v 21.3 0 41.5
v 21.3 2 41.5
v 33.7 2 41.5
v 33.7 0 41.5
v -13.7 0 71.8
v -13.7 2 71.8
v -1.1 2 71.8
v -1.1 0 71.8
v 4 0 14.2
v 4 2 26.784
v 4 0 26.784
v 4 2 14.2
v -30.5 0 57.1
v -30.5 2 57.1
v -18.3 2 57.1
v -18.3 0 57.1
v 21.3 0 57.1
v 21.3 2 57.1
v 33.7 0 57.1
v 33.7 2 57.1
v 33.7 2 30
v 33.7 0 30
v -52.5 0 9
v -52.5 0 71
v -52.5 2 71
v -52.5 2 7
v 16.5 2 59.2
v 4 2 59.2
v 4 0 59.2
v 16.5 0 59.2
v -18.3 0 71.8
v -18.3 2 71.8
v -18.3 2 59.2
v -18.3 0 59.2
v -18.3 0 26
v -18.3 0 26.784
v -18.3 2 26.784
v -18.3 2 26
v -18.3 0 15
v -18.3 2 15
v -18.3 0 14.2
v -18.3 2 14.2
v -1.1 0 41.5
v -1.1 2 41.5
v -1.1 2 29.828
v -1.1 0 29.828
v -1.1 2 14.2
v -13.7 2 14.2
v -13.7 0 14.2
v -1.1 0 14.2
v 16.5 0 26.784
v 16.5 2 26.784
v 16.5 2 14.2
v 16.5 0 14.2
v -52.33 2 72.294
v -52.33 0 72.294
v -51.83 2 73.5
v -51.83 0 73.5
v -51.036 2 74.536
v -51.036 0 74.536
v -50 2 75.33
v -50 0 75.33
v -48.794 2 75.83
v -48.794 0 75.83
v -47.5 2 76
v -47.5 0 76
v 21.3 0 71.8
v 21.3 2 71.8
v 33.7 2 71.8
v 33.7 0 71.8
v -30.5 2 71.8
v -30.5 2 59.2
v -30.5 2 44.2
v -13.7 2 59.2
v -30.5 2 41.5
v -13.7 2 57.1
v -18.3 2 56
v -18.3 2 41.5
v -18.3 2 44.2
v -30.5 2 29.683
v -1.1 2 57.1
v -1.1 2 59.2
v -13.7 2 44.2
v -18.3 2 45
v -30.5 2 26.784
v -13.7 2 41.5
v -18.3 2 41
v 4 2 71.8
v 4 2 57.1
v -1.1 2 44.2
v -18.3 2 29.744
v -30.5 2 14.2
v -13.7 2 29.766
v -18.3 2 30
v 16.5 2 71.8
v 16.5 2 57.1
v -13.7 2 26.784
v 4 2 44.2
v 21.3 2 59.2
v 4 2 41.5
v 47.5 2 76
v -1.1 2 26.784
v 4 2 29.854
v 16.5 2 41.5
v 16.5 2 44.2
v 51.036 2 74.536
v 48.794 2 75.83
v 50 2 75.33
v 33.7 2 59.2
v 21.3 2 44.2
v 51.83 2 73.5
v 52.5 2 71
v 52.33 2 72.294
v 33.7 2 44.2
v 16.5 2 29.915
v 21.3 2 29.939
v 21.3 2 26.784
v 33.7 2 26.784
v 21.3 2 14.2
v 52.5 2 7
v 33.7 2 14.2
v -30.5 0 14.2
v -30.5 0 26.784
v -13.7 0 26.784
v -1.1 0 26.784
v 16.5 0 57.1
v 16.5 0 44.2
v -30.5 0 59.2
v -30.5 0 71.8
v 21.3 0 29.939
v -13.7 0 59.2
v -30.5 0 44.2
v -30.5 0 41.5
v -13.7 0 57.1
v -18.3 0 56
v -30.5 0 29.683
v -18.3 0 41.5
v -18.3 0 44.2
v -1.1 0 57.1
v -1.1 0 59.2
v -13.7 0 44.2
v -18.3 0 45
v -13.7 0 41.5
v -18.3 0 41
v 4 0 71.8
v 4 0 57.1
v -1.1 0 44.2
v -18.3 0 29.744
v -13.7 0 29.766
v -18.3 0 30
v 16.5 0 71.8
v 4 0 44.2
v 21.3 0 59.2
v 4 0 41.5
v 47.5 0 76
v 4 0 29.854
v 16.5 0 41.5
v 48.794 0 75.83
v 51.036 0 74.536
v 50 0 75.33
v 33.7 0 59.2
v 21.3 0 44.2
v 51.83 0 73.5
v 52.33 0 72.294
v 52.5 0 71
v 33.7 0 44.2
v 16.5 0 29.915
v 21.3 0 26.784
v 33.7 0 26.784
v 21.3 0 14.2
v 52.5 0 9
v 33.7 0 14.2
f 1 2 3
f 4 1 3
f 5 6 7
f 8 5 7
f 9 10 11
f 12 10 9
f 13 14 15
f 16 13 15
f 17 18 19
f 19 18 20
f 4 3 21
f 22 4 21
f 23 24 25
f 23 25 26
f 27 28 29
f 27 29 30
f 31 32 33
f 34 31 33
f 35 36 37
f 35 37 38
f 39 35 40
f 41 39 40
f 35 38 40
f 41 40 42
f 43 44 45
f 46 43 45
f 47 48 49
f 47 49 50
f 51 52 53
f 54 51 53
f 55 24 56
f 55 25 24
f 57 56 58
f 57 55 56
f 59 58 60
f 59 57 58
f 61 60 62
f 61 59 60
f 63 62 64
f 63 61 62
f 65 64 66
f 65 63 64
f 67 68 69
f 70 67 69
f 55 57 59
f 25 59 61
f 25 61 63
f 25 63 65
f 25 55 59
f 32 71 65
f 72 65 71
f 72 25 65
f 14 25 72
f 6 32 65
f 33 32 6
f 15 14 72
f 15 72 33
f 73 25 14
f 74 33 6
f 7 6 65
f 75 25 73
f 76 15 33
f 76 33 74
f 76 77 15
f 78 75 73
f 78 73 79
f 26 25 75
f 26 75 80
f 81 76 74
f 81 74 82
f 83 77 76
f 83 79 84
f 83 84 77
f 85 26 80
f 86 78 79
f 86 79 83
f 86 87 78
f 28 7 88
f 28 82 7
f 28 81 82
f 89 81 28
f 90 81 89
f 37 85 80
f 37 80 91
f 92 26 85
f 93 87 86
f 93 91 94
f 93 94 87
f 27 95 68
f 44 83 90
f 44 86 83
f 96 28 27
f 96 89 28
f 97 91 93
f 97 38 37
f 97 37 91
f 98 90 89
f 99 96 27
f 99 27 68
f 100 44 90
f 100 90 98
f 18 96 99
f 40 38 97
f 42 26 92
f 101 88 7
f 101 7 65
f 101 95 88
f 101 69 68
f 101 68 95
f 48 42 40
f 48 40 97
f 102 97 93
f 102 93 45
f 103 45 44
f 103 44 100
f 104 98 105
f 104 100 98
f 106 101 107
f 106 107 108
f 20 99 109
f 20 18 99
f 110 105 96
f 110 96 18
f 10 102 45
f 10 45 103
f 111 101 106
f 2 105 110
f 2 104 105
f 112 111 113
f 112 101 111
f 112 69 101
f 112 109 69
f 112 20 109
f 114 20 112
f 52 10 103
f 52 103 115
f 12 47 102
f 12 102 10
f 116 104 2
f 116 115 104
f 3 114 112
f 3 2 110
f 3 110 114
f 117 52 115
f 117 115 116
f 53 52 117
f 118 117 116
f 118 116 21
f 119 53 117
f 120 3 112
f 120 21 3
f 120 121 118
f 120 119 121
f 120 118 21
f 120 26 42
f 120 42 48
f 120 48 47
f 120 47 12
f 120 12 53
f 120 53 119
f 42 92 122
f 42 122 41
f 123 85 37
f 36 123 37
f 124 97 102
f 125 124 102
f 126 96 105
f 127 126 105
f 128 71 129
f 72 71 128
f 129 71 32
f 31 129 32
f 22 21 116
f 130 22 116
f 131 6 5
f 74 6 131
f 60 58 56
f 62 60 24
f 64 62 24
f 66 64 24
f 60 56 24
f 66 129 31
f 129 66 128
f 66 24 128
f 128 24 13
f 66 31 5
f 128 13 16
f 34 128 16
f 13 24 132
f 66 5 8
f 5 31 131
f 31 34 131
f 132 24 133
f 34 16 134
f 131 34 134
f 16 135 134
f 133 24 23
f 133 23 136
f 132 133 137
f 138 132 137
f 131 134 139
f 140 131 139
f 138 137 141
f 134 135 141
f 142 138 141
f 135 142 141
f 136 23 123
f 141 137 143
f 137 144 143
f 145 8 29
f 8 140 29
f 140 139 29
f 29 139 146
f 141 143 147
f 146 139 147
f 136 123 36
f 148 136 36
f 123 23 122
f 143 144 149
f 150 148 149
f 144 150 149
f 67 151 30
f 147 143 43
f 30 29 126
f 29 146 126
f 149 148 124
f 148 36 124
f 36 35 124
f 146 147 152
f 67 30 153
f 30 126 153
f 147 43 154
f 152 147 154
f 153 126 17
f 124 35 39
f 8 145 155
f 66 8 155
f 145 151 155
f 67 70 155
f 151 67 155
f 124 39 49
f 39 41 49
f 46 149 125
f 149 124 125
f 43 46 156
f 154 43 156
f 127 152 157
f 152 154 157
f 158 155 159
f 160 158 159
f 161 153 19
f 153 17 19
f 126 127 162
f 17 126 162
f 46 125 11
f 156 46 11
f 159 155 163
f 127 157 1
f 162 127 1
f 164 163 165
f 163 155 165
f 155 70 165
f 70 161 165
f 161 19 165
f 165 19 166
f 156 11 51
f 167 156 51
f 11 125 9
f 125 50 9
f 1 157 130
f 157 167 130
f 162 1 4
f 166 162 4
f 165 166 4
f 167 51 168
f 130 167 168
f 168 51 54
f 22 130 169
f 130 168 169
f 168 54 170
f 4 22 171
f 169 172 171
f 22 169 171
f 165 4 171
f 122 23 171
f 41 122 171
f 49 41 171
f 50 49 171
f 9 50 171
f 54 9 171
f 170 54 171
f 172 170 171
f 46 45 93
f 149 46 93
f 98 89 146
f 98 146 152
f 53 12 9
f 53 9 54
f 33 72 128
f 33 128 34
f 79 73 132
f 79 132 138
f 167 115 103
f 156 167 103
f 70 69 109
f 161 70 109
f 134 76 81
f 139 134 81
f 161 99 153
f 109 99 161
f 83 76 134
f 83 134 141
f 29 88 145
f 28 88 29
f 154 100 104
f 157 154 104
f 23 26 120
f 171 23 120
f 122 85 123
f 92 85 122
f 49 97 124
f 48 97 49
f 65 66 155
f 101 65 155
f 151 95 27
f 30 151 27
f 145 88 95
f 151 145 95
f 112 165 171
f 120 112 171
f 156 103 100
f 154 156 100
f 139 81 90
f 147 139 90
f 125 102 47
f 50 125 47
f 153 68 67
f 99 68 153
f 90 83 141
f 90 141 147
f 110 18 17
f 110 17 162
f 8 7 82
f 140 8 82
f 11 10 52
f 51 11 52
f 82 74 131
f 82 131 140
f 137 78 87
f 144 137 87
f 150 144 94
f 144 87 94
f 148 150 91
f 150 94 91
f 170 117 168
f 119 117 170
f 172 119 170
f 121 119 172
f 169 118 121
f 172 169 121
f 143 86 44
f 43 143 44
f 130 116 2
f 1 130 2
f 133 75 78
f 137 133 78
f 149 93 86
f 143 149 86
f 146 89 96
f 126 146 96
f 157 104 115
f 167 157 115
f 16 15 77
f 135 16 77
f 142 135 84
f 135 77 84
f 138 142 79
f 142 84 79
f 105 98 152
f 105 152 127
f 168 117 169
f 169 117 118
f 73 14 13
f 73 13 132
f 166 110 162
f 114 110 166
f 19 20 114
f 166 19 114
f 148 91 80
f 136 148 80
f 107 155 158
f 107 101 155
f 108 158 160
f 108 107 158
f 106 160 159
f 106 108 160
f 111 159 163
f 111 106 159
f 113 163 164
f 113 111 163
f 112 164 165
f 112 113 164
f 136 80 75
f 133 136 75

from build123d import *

# Parameters (mm, degrees)
SKETCH2_W           = 105
SKETCH2_H           = 69
SKETCH2_W_2         = 12.176237233
SKETCH2_H_2         = 12
SKETCH2_W_3         = 12
SKETCH2_W_4         = 11
SKETCH2_H_3         = 11
SKETCH2_W_5         = 10.781198293
BOSS_EXTRUDE1_DEPTH = 2
FILLET1_R           = 5
FILLET2_R           = 5
CHAMFER1_SIZE       = 2
SKETCH3_W           = 12.4
SKETCH3_H           = 12.584292926
SKETCH3_W_2         = 12.5
SKETCH3_W_3         = 12.6
SKETCH3_W_4         = 12.2
SKETCH3_H_2         = 12.9
SKETCH3_H_3         = 12.6
CUT_EXTRUDE1_DEPTH  = 10
SKETCH4_W           = 0.6
SKETCH4_H           = 11
BOSS_EXTRUDE2_DEPTH = 2
SKETCH5_W           = 0.6
SKETCH5_H           = 11
BOSS_EXTRUDE3_DEPTH = 2
SKETCH6_W           = 0.8
SKETCH6_H           = 11
SKETCH6_W_2         = 0.4
SKETCH6_W_3         = 0.776237233
BOSS_EXTRUDE4_DEPTH = 2


with BuildPart() as part:
    # Sketch2 → Boss-Extrude1 (new body)
    with BuildSketch(Plane(origin=(0, 0, 0), x_dir=(1, 0, 0), z_dir=(0, 1, 0))):
        with Locations((0, -41.5)):
            Rectangle(SKETCH2_W, SKETCH2_H)
        with Locations((-23.611881384, -66)):
            Rectangle(SKETCH2_W_2, SKETCH2_H_2, mode=Mode.SUBTRACT)
        with Locations((11.3, -66)):
            Rectangle(SKETCH2_W_3, SKETCH2_H_2, mode=Mode.SUBTRACT)
        with Locations((28.8, -66)):
            Rectangle(SKETCH2_W_4, SKETCH2_H_2, mode=Mode.SUBTRACT)
        with Locations((28.8, -20.5)):
            Rectangle(SKETCH2_W_4, SKETCH2_H_3, mode=Mode.SUBTRACT)
        with Locations((11.3, -20.5)):
            Rectangle(SKETCH2_W_3, SKETCH2_H_3, mode=Mode.SUBTRACT)
        with Locations((-6.090599146, -20.5)):
            Rectangle(SKETCH2_W_5, SKETCH2_H_3, mode=Mode.SUBTRACT)
        with Locations((-6.090599146, -66)):
            Rectangle(SKETCH2_W_5, SKETCH2_H_2, mode=Mode.SUBTRACT)
        with Locations((-23.611881384, -20.5)):
            Rectangle(SKETCH2_W_2, SKETCH2_H_3, mode=Mode.SUBTRACT)
        with Locations((-23.611881384, -35.5)):
            Rectangle(SKETCH2_W_2, SKETCH2_H_3, mode=Mode.SUBTRACT)
        with Locations((-23.611881384, -50.5)):
            Rectangle(SKETCH2_W_2, SKETCH2_H_3, mode=Mode.SUBTRACT)
        with Locations((28.8, -50.5)):
            Rectangle(SKETCH2_W_4, SKETCH2_H_3, mode=Mode.SUBTRACT)
        with Locations((28.8, -35.5)):
            Rectangle(SKETCH2_W_4, SKETCH2_H_3, mode=Mode.SUBTRACT)
        with Locations((11.3, -50.5)):
            Rectangle(SKETCH2_W_3, SKETCH2_H_3, mode=Mode.SUBTRACT)
        with Locations((-6.090599146, -50.5)):
            Rectangle(SKETCH2_W_5, SKETCH2_H_3, mode=Mode.SUBTRACT)
        with Locations((-6.090599146, -35.5)):
            Rectangle(SKETCH2_W_5, SKETCH2_H_3, mode=Mode.SUBTRACT)
        with Locations((11.3, -35.5)):
            Rectangle(SKETCH2_W_3, SKETCH2_H_3, mode=Mode.SUBTRACT)
    extrude(amount=BOSS_EXTRUDE1_DEPTH)

    # Fillet1
    fillet1_edges = [part.edges().sort_by_distance(p)[0] for p in [
        (-52.5, 1, 76),
    ]]
    fillet(fillet1_edges, radius=FILLET1_R)

    # Fillet2
    fillet2_edges = [part.edges().sort_by_distance(p)[0] for p in [
        (52.5, 1, 76),
    ]]
    fillet(fillet2_edges, radius=FILLET2_R)

    # Chamfer1
    chamfer1_edges = [part.edges().sort_by_distance(p)[0] for p in [
        (0, 0, 7),
    ]]
    chamfer(chamfer1_edges, length=CHAMFER1_SIZE - 0.0001)  # a hair under: the kernel refuses the full size

    # Sketch3 → Cut-Extrude1 (cut)
    with BuildSketch(Plane(origin=(0, 2, 0), x_dir=(1, 0, 0), z_dir=(0, 1, 0))):
        with Locations((27.5, -20.492146463)):
            Rectangle(SKETCH3_W, SKETCH3_H)
        with Locations((10.25, -20.492146463)):
            Rectangle(SKETCH3_W_2, SKETCH3_H)
        with Locations((-7.4, -20.492146463)):
            Rectangle(SKETCH3_W_3, SKETCH3_H)
        with Locations((-24.4, -20.492146463)):
            Rectangle(SKETCH3_W_4, SKETCH3_H)
        Polygon((-30.5, -41.5), (-18.3, -41.5), (-18.3, -29.743553264), (-30.5, -29.683386914), align=None)
        Polygon((-13.7, -41.5), (-1.1, -41.5), (-1.1, -29.828377953), (-13.7, -29.766238937), align=None)
        Polygon((4, -41.5), (16.5, -41.5), (16.5, -29.91517531), (4, -29.85352946), align=None)
        Polygon((21.3, -41.5), (33.7, -41.5), (33.7, -30), (21.3, -29.938847317), align=None)
        with Locations((27.5, -50.65)):
            Rectangle(SKETCH3_W, SKETCH3_H_2)
        with Locations((10.25, -50.65)):
            Rectangle(SKETCH3_W_2, SKETCH3_H_2)
        with Locations((-7.4, -50.65)):
            Rectangle(SKETCH3_W_3, SKETCH3_H_2)
        with Locations((-24.4, -50.65)):
            Rectangle(SKETCH3_W_4, SKETCH3_H_2)
        with Locations((-24.4, -65.5)):
            Rectangle(SKETCH3_W_4, SKETCH3_H_3)
        with Locations((-7.4, -65.5)):
            Rectangle(SKETCH3_W_3, SKETCH3_H_3)
        with Locations((10.25, -65.5)):
            Rectangle(SKETCH3_W_2, SKETCH3_H_3)
        with Locations((27.5, -65.5)):
            Rectangle(SKETCH3_W, SKETCH3_H_3)
    extrude(amount=-CUT_EXTRUDE1_DEPTH, mode=Mode.SUBTRACT)

    # Sketch4 → Boss-Extrude2 (add)
    with BuildSketch(Plane(origin=(0, 2, 0), x_dir=(1, 0, 0), z_dir=(0, 1, 0))):
        with Locations((34, -20.5)):
            Rectangle(SKETCH4_W, SKETCH4_H)
    extrude(amount=-BOSS_EXTRUDE2_DEPTH)

    # Sketch5 → Boss-Extrude3 (add)
    with BuildSketch(Plane(origin=(0, 2, 0), x_dir=(1, 0, 0), z_dir=(0, 1, 0))):
        with Locations((34, -35.5)):
            Rectangle(SKETCH5_W, SKETCH5_H)
        with Locations((34, -50.5)):
            Rectangle(SKETCH5_W, SKETCH5_H)
        Polygon((33.7, -60), (34.3, -60), (34.3, -72), (23.3, -72), (23.3, -71.8), (33.7, -71.8), align=None)
    extrude(amount=-BOSS_EXTRUDE3_DEPTH)

    # Sketch6 → Boss-Extrude4 (add)
    with BuildSketch(Plane(origin=(0, 2, 0), x_dir=(1, 0, 0), z_dir=(0, 1, 0))):
        with Locations((16.9, -20.5)):
            Rectangle(SKETCH6_W, SKETCH6_H)
        with Locations((16.9, -35.5)):
            Rectangle(SKETCH6_W, SKETCH6_H)
        with Locations((16.9, -50.5)):
            Rectangle(SKETCH6_W, SKETCH6_H)
        Polygon((16.5, -60), (17.3, -60), (17.3, -72), (5.3, -72), (5.3, -71.8), (16.5, -71.8), align=None)
        Polygon((-1.1, -60), (-0.7, -60), (-0.7, -72), (-11.481198293, -72), (-11.481198293, -71.8), (-1.1, -71.8), align=None)
        Polygon((-18.3, -60), (-17.523762767, -60), (-17.523762767, -72), (-29.7, -72), (-29.7, -71.8), (-18.3, -71.8), align=None)
        with Locations((-0.9, -50.5)):
            Rectangle(SKETCH6_W_2, SKETCH6_H)
        with Locations((-0.9, -35.5)):
            Rectangle(SKETCH6_W_2, SKETCH6_H)
        with Locations((-0.9, -20.5)):
            Rectangle(SKETCH6_W_2, SKETCH6_H)
        with Locations((-17.911881384, -20.5)):
            Rectangle(SKETCH6_W_3, SKETCH6_H)
        with Locations((-17.911881384, -35.5)):
            Rectangle(SKETCH6_W_3, SKETCH6_H)
        with Locations((-17.911881384, -50.5)):
            Rectangle(SKETCH6_W_3, SKETCH6_H)
    extrude(amount=-BOSS_EXTRUDE4_DEPTH)


solid = part.part
